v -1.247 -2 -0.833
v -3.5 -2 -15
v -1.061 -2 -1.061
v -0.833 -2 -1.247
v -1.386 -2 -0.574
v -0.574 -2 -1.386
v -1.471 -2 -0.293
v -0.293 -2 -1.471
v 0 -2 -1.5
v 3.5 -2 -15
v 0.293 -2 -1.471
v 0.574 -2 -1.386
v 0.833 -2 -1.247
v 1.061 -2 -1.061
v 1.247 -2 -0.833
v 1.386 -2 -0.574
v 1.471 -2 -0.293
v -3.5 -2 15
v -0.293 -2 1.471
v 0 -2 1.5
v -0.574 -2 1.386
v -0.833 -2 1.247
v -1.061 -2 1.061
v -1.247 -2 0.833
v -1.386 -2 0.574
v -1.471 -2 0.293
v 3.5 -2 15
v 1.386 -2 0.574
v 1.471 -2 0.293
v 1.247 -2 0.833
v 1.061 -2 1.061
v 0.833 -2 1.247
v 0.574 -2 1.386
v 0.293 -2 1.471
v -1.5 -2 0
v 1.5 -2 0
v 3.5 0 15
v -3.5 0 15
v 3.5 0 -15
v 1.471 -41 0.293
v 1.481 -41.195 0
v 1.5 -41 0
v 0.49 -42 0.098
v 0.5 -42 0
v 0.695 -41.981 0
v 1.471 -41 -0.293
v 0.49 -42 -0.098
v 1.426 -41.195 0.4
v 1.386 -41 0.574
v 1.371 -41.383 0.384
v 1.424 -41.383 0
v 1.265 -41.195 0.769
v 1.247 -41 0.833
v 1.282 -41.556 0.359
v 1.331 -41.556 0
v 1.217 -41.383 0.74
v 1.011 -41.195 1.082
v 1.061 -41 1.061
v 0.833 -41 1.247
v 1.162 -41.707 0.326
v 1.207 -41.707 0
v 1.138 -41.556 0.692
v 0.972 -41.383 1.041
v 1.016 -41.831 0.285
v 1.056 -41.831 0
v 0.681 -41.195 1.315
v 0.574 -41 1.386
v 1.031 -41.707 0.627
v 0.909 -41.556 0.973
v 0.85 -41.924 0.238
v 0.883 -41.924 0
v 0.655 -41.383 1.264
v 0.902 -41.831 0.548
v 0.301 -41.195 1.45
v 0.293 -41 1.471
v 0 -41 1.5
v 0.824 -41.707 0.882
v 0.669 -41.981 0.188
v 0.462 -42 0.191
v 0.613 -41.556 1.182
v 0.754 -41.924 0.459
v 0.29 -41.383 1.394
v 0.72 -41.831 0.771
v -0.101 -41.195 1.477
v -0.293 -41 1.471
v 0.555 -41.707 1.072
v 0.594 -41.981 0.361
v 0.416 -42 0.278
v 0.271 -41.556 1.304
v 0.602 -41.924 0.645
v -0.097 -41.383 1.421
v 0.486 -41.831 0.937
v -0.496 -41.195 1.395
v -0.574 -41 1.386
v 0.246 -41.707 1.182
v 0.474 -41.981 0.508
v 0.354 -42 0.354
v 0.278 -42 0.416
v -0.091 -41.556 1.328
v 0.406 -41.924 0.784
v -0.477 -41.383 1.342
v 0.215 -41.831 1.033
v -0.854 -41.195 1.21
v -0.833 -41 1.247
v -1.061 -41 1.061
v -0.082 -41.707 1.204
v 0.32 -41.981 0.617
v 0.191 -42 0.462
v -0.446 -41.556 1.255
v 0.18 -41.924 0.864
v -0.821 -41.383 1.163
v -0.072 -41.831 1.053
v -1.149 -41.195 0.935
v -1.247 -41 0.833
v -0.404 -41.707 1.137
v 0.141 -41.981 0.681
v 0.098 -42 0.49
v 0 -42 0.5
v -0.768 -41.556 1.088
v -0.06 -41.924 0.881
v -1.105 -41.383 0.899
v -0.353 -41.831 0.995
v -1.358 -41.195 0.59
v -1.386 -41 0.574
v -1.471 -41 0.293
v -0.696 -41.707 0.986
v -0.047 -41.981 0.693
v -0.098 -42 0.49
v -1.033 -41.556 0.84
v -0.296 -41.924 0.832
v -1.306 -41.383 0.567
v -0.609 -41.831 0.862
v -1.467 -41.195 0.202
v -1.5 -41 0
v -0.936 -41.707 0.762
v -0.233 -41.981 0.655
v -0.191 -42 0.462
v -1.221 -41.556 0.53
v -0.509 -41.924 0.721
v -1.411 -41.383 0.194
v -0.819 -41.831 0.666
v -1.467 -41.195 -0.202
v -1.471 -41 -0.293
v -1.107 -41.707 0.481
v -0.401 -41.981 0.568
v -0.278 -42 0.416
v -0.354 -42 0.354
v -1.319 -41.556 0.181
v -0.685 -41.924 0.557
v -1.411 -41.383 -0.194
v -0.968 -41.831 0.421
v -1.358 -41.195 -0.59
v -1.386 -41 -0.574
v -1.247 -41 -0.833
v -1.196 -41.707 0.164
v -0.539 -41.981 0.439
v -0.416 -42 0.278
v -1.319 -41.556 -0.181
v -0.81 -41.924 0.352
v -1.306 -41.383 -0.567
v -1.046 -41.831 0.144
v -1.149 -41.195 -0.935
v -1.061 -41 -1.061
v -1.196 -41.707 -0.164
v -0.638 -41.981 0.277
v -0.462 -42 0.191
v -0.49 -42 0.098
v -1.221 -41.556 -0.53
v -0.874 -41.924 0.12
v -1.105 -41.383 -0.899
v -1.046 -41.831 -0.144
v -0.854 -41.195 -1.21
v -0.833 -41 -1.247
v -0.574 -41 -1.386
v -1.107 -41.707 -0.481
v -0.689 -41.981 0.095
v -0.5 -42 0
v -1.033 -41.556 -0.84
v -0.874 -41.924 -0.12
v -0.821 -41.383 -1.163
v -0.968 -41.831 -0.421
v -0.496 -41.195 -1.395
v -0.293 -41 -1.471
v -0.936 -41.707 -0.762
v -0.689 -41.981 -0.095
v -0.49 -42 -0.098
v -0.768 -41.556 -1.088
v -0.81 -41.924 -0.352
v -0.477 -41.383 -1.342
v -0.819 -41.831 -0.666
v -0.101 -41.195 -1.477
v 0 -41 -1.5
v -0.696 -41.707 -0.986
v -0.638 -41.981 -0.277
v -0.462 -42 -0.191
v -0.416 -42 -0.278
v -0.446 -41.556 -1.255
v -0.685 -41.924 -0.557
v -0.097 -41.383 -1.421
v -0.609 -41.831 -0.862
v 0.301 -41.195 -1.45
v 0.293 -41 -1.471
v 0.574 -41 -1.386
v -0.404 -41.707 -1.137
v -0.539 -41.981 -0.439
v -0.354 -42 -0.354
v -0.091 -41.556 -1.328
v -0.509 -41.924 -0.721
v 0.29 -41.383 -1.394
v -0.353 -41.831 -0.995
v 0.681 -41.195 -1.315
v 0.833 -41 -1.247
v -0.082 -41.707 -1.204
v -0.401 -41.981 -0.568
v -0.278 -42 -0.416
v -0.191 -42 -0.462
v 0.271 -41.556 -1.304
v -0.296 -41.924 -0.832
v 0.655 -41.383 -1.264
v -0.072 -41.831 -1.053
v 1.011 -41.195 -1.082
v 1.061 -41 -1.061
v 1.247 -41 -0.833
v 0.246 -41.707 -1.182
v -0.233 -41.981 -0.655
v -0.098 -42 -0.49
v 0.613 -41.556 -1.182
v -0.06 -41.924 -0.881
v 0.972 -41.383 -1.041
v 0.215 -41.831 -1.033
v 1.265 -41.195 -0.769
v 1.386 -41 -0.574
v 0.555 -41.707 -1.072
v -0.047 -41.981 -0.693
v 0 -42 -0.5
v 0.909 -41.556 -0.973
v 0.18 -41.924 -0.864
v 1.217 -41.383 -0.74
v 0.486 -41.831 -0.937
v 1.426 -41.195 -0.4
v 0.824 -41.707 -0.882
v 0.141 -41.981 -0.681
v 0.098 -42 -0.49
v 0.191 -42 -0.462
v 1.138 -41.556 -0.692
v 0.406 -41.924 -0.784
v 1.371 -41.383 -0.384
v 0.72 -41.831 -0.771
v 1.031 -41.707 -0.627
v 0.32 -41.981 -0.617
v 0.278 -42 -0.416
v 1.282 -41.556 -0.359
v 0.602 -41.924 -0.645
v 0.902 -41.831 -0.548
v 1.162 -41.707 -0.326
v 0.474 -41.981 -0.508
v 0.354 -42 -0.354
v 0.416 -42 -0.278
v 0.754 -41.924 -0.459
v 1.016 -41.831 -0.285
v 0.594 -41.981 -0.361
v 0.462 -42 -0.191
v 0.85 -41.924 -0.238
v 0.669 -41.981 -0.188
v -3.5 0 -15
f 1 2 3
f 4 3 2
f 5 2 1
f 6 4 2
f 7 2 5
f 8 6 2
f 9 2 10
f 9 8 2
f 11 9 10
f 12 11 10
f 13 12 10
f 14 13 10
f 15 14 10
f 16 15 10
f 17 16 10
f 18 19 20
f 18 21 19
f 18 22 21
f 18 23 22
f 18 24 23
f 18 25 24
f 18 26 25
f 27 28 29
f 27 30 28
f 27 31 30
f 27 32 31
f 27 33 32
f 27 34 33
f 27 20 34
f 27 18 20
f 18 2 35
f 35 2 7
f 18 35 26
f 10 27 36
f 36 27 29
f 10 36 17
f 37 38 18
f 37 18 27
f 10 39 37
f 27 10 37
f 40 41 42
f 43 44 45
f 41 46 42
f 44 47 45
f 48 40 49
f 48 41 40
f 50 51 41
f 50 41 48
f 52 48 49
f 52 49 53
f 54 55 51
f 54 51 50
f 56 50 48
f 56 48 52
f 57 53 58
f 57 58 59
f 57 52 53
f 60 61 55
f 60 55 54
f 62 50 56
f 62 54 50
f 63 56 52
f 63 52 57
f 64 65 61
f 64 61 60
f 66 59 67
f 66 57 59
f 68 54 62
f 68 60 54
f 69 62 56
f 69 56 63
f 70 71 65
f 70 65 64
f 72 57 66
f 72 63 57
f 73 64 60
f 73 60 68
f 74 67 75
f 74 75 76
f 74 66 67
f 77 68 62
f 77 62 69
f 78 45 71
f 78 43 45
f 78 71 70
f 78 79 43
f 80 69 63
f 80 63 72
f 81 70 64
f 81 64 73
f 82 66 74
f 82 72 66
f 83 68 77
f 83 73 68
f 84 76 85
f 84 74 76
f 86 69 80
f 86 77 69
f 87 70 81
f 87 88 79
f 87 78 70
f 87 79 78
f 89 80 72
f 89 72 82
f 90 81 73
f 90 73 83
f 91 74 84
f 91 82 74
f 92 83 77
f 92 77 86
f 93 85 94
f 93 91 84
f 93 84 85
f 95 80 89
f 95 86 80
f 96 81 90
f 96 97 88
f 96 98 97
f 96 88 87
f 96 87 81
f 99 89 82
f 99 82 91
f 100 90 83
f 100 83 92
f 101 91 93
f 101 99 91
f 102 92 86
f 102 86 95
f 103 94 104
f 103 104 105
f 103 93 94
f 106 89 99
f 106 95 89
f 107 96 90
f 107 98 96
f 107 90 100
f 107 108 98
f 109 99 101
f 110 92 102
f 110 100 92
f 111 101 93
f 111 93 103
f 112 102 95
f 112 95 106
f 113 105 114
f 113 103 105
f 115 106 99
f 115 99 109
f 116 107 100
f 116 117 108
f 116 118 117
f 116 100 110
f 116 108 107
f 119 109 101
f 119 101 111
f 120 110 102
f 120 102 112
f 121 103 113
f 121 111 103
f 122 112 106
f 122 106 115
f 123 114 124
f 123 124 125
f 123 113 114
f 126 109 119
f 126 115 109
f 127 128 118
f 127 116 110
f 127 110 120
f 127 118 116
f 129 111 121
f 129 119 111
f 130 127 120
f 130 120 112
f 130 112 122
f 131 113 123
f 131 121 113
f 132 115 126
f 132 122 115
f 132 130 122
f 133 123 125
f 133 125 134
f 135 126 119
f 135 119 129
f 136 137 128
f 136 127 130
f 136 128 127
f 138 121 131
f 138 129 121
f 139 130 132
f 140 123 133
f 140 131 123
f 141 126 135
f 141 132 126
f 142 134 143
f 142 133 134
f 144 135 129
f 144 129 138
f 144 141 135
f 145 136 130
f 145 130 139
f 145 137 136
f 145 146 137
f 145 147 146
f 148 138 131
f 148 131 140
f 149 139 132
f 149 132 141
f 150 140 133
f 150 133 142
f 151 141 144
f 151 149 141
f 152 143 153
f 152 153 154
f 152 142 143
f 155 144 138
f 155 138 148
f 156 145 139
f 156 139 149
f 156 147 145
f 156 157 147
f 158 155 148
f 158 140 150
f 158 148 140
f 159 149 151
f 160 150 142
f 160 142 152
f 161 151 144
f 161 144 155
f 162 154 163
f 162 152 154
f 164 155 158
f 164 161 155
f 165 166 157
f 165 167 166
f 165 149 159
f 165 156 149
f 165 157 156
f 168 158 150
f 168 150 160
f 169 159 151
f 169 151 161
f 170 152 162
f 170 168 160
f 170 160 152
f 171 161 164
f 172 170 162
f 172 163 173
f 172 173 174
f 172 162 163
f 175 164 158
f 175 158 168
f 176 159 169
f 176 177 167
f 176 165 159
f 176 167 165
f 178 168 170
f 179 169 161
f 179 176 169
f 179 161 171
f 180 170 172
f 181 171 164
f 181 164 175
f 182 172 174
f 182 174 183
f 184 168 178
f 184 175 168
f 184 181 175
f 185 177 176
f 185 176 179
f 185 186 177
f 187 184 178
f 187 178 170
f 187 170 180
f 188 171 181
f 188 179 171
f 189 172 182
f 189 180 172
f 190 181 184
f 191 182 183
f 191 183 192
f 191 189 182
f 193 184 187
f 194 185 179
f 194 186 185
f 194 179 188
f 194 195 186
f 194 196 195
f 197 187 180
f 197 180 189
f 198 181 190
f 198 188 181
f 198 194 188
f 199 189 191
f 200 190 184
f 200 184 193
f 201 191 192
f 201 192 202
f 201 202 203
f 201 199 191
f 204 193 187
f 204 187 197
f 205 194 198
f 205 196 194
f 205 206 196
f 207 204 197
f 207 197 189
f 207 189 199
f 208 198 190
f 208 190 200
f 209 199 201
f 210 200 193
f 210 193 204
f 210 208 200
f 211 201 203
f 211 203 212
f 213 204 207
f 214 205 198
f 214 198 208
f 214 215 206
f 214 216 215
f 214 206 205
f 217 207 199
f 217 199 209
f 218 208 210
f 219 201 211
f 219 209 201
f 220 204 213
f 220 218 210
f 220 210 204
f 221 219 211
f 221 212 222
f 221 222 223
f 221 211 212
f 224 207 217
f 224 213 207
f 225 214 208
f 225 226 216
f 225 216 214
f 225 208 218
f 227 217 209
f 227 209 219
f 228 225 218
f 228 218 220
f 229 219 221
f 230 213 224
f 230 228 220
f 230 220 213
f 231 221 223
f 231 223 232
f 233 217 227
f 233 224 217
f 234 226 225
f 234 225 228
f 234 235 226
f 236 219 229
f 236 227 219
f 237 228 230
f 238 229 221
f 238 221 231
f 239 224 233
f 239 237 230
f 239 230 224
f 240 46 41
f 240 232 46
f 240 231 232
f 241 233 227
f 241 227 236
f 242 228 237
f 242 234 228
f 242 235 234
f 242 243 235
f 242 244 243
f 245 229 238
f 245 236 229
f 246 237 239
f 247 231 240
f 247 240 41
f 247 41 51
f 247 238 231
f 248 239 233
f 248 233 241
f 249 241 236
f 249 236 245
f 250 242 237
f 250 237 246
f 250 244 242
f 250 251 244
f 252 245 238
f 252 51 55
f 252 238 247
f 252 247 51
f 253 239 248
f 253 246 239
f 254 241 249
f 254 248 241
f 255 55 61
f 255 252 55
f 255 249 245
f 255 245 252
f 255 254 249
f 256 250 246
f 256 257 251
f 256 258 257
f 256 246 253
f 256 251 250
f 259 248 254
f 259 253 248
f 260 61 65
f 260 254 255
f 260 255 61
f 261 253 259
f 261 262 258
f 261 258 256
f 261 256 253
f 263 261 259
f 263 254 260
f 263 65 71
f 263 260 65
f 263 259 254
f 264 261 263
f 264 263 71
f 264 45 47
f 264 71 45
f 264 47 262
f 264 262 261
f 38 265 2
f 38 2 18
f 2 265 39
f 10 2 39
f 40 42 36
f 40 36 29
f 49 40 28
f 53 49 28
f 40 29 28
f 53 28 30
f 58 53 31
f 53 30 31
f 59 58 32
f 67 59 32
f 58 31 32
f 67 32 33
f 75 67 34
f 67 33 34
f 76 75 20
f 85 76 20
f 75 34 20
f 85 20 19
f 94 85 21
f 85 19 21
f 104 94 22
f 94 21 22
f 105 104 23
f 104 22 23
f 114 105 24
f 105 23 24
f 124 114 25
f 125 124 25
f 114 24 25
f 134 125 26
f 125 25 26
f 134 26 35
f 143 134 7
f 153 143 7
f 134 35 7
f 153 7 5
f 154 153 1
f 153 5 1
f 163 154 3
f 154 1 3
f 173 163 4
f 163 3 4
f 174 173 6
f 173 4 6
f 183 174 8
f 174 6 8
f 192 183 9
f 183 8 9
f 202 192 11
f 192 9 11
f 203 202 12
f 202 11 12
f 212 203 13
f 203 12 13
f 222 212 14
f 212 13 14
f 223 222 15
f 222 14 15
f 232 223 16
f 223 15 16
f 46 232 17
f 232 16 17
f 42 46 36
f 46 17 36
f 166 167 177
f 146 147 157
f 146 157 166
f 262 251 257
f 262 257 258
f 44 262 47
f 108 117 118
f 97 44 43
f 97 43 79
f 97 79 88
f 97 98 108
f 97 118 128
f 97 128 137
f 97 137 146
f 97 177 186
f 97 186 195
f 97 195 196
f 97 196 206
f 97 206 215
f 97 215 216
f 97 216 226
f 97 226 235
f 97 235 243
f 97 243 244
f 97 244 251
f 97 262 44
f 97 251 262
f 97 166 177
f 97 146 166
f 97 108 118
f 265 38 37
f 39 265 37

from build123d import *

# Parameters (mm, degrees)
F0_W     = 7
F0_H     = 30
F1_DEPTH = 2
F2_R     = 1.5
F3_DEPTH = 40
F4_R     = 1


with BuildPart() as f1:
    # F0 (on Front) → F1 (new body)
    with BuildSketch(Plane.XZ):
        Rectangle(F0_W, F0_H)
    extrude(amount=F1_DEPTH)

    # F2 (on face) → F3 (join)
    with BuildSketch(Plane.XZ.offset(2)):
        Circle(F2_R)
    extrude(amount=F3_DEPTH)

    # F4
    f4_edges = [f1.edges().sort_by_distance(p)[0] for p in [
        (-1.5, -42, 0),
    ]]
    fillet(f4_edges, radius=F4_R)


solid = f1.part
